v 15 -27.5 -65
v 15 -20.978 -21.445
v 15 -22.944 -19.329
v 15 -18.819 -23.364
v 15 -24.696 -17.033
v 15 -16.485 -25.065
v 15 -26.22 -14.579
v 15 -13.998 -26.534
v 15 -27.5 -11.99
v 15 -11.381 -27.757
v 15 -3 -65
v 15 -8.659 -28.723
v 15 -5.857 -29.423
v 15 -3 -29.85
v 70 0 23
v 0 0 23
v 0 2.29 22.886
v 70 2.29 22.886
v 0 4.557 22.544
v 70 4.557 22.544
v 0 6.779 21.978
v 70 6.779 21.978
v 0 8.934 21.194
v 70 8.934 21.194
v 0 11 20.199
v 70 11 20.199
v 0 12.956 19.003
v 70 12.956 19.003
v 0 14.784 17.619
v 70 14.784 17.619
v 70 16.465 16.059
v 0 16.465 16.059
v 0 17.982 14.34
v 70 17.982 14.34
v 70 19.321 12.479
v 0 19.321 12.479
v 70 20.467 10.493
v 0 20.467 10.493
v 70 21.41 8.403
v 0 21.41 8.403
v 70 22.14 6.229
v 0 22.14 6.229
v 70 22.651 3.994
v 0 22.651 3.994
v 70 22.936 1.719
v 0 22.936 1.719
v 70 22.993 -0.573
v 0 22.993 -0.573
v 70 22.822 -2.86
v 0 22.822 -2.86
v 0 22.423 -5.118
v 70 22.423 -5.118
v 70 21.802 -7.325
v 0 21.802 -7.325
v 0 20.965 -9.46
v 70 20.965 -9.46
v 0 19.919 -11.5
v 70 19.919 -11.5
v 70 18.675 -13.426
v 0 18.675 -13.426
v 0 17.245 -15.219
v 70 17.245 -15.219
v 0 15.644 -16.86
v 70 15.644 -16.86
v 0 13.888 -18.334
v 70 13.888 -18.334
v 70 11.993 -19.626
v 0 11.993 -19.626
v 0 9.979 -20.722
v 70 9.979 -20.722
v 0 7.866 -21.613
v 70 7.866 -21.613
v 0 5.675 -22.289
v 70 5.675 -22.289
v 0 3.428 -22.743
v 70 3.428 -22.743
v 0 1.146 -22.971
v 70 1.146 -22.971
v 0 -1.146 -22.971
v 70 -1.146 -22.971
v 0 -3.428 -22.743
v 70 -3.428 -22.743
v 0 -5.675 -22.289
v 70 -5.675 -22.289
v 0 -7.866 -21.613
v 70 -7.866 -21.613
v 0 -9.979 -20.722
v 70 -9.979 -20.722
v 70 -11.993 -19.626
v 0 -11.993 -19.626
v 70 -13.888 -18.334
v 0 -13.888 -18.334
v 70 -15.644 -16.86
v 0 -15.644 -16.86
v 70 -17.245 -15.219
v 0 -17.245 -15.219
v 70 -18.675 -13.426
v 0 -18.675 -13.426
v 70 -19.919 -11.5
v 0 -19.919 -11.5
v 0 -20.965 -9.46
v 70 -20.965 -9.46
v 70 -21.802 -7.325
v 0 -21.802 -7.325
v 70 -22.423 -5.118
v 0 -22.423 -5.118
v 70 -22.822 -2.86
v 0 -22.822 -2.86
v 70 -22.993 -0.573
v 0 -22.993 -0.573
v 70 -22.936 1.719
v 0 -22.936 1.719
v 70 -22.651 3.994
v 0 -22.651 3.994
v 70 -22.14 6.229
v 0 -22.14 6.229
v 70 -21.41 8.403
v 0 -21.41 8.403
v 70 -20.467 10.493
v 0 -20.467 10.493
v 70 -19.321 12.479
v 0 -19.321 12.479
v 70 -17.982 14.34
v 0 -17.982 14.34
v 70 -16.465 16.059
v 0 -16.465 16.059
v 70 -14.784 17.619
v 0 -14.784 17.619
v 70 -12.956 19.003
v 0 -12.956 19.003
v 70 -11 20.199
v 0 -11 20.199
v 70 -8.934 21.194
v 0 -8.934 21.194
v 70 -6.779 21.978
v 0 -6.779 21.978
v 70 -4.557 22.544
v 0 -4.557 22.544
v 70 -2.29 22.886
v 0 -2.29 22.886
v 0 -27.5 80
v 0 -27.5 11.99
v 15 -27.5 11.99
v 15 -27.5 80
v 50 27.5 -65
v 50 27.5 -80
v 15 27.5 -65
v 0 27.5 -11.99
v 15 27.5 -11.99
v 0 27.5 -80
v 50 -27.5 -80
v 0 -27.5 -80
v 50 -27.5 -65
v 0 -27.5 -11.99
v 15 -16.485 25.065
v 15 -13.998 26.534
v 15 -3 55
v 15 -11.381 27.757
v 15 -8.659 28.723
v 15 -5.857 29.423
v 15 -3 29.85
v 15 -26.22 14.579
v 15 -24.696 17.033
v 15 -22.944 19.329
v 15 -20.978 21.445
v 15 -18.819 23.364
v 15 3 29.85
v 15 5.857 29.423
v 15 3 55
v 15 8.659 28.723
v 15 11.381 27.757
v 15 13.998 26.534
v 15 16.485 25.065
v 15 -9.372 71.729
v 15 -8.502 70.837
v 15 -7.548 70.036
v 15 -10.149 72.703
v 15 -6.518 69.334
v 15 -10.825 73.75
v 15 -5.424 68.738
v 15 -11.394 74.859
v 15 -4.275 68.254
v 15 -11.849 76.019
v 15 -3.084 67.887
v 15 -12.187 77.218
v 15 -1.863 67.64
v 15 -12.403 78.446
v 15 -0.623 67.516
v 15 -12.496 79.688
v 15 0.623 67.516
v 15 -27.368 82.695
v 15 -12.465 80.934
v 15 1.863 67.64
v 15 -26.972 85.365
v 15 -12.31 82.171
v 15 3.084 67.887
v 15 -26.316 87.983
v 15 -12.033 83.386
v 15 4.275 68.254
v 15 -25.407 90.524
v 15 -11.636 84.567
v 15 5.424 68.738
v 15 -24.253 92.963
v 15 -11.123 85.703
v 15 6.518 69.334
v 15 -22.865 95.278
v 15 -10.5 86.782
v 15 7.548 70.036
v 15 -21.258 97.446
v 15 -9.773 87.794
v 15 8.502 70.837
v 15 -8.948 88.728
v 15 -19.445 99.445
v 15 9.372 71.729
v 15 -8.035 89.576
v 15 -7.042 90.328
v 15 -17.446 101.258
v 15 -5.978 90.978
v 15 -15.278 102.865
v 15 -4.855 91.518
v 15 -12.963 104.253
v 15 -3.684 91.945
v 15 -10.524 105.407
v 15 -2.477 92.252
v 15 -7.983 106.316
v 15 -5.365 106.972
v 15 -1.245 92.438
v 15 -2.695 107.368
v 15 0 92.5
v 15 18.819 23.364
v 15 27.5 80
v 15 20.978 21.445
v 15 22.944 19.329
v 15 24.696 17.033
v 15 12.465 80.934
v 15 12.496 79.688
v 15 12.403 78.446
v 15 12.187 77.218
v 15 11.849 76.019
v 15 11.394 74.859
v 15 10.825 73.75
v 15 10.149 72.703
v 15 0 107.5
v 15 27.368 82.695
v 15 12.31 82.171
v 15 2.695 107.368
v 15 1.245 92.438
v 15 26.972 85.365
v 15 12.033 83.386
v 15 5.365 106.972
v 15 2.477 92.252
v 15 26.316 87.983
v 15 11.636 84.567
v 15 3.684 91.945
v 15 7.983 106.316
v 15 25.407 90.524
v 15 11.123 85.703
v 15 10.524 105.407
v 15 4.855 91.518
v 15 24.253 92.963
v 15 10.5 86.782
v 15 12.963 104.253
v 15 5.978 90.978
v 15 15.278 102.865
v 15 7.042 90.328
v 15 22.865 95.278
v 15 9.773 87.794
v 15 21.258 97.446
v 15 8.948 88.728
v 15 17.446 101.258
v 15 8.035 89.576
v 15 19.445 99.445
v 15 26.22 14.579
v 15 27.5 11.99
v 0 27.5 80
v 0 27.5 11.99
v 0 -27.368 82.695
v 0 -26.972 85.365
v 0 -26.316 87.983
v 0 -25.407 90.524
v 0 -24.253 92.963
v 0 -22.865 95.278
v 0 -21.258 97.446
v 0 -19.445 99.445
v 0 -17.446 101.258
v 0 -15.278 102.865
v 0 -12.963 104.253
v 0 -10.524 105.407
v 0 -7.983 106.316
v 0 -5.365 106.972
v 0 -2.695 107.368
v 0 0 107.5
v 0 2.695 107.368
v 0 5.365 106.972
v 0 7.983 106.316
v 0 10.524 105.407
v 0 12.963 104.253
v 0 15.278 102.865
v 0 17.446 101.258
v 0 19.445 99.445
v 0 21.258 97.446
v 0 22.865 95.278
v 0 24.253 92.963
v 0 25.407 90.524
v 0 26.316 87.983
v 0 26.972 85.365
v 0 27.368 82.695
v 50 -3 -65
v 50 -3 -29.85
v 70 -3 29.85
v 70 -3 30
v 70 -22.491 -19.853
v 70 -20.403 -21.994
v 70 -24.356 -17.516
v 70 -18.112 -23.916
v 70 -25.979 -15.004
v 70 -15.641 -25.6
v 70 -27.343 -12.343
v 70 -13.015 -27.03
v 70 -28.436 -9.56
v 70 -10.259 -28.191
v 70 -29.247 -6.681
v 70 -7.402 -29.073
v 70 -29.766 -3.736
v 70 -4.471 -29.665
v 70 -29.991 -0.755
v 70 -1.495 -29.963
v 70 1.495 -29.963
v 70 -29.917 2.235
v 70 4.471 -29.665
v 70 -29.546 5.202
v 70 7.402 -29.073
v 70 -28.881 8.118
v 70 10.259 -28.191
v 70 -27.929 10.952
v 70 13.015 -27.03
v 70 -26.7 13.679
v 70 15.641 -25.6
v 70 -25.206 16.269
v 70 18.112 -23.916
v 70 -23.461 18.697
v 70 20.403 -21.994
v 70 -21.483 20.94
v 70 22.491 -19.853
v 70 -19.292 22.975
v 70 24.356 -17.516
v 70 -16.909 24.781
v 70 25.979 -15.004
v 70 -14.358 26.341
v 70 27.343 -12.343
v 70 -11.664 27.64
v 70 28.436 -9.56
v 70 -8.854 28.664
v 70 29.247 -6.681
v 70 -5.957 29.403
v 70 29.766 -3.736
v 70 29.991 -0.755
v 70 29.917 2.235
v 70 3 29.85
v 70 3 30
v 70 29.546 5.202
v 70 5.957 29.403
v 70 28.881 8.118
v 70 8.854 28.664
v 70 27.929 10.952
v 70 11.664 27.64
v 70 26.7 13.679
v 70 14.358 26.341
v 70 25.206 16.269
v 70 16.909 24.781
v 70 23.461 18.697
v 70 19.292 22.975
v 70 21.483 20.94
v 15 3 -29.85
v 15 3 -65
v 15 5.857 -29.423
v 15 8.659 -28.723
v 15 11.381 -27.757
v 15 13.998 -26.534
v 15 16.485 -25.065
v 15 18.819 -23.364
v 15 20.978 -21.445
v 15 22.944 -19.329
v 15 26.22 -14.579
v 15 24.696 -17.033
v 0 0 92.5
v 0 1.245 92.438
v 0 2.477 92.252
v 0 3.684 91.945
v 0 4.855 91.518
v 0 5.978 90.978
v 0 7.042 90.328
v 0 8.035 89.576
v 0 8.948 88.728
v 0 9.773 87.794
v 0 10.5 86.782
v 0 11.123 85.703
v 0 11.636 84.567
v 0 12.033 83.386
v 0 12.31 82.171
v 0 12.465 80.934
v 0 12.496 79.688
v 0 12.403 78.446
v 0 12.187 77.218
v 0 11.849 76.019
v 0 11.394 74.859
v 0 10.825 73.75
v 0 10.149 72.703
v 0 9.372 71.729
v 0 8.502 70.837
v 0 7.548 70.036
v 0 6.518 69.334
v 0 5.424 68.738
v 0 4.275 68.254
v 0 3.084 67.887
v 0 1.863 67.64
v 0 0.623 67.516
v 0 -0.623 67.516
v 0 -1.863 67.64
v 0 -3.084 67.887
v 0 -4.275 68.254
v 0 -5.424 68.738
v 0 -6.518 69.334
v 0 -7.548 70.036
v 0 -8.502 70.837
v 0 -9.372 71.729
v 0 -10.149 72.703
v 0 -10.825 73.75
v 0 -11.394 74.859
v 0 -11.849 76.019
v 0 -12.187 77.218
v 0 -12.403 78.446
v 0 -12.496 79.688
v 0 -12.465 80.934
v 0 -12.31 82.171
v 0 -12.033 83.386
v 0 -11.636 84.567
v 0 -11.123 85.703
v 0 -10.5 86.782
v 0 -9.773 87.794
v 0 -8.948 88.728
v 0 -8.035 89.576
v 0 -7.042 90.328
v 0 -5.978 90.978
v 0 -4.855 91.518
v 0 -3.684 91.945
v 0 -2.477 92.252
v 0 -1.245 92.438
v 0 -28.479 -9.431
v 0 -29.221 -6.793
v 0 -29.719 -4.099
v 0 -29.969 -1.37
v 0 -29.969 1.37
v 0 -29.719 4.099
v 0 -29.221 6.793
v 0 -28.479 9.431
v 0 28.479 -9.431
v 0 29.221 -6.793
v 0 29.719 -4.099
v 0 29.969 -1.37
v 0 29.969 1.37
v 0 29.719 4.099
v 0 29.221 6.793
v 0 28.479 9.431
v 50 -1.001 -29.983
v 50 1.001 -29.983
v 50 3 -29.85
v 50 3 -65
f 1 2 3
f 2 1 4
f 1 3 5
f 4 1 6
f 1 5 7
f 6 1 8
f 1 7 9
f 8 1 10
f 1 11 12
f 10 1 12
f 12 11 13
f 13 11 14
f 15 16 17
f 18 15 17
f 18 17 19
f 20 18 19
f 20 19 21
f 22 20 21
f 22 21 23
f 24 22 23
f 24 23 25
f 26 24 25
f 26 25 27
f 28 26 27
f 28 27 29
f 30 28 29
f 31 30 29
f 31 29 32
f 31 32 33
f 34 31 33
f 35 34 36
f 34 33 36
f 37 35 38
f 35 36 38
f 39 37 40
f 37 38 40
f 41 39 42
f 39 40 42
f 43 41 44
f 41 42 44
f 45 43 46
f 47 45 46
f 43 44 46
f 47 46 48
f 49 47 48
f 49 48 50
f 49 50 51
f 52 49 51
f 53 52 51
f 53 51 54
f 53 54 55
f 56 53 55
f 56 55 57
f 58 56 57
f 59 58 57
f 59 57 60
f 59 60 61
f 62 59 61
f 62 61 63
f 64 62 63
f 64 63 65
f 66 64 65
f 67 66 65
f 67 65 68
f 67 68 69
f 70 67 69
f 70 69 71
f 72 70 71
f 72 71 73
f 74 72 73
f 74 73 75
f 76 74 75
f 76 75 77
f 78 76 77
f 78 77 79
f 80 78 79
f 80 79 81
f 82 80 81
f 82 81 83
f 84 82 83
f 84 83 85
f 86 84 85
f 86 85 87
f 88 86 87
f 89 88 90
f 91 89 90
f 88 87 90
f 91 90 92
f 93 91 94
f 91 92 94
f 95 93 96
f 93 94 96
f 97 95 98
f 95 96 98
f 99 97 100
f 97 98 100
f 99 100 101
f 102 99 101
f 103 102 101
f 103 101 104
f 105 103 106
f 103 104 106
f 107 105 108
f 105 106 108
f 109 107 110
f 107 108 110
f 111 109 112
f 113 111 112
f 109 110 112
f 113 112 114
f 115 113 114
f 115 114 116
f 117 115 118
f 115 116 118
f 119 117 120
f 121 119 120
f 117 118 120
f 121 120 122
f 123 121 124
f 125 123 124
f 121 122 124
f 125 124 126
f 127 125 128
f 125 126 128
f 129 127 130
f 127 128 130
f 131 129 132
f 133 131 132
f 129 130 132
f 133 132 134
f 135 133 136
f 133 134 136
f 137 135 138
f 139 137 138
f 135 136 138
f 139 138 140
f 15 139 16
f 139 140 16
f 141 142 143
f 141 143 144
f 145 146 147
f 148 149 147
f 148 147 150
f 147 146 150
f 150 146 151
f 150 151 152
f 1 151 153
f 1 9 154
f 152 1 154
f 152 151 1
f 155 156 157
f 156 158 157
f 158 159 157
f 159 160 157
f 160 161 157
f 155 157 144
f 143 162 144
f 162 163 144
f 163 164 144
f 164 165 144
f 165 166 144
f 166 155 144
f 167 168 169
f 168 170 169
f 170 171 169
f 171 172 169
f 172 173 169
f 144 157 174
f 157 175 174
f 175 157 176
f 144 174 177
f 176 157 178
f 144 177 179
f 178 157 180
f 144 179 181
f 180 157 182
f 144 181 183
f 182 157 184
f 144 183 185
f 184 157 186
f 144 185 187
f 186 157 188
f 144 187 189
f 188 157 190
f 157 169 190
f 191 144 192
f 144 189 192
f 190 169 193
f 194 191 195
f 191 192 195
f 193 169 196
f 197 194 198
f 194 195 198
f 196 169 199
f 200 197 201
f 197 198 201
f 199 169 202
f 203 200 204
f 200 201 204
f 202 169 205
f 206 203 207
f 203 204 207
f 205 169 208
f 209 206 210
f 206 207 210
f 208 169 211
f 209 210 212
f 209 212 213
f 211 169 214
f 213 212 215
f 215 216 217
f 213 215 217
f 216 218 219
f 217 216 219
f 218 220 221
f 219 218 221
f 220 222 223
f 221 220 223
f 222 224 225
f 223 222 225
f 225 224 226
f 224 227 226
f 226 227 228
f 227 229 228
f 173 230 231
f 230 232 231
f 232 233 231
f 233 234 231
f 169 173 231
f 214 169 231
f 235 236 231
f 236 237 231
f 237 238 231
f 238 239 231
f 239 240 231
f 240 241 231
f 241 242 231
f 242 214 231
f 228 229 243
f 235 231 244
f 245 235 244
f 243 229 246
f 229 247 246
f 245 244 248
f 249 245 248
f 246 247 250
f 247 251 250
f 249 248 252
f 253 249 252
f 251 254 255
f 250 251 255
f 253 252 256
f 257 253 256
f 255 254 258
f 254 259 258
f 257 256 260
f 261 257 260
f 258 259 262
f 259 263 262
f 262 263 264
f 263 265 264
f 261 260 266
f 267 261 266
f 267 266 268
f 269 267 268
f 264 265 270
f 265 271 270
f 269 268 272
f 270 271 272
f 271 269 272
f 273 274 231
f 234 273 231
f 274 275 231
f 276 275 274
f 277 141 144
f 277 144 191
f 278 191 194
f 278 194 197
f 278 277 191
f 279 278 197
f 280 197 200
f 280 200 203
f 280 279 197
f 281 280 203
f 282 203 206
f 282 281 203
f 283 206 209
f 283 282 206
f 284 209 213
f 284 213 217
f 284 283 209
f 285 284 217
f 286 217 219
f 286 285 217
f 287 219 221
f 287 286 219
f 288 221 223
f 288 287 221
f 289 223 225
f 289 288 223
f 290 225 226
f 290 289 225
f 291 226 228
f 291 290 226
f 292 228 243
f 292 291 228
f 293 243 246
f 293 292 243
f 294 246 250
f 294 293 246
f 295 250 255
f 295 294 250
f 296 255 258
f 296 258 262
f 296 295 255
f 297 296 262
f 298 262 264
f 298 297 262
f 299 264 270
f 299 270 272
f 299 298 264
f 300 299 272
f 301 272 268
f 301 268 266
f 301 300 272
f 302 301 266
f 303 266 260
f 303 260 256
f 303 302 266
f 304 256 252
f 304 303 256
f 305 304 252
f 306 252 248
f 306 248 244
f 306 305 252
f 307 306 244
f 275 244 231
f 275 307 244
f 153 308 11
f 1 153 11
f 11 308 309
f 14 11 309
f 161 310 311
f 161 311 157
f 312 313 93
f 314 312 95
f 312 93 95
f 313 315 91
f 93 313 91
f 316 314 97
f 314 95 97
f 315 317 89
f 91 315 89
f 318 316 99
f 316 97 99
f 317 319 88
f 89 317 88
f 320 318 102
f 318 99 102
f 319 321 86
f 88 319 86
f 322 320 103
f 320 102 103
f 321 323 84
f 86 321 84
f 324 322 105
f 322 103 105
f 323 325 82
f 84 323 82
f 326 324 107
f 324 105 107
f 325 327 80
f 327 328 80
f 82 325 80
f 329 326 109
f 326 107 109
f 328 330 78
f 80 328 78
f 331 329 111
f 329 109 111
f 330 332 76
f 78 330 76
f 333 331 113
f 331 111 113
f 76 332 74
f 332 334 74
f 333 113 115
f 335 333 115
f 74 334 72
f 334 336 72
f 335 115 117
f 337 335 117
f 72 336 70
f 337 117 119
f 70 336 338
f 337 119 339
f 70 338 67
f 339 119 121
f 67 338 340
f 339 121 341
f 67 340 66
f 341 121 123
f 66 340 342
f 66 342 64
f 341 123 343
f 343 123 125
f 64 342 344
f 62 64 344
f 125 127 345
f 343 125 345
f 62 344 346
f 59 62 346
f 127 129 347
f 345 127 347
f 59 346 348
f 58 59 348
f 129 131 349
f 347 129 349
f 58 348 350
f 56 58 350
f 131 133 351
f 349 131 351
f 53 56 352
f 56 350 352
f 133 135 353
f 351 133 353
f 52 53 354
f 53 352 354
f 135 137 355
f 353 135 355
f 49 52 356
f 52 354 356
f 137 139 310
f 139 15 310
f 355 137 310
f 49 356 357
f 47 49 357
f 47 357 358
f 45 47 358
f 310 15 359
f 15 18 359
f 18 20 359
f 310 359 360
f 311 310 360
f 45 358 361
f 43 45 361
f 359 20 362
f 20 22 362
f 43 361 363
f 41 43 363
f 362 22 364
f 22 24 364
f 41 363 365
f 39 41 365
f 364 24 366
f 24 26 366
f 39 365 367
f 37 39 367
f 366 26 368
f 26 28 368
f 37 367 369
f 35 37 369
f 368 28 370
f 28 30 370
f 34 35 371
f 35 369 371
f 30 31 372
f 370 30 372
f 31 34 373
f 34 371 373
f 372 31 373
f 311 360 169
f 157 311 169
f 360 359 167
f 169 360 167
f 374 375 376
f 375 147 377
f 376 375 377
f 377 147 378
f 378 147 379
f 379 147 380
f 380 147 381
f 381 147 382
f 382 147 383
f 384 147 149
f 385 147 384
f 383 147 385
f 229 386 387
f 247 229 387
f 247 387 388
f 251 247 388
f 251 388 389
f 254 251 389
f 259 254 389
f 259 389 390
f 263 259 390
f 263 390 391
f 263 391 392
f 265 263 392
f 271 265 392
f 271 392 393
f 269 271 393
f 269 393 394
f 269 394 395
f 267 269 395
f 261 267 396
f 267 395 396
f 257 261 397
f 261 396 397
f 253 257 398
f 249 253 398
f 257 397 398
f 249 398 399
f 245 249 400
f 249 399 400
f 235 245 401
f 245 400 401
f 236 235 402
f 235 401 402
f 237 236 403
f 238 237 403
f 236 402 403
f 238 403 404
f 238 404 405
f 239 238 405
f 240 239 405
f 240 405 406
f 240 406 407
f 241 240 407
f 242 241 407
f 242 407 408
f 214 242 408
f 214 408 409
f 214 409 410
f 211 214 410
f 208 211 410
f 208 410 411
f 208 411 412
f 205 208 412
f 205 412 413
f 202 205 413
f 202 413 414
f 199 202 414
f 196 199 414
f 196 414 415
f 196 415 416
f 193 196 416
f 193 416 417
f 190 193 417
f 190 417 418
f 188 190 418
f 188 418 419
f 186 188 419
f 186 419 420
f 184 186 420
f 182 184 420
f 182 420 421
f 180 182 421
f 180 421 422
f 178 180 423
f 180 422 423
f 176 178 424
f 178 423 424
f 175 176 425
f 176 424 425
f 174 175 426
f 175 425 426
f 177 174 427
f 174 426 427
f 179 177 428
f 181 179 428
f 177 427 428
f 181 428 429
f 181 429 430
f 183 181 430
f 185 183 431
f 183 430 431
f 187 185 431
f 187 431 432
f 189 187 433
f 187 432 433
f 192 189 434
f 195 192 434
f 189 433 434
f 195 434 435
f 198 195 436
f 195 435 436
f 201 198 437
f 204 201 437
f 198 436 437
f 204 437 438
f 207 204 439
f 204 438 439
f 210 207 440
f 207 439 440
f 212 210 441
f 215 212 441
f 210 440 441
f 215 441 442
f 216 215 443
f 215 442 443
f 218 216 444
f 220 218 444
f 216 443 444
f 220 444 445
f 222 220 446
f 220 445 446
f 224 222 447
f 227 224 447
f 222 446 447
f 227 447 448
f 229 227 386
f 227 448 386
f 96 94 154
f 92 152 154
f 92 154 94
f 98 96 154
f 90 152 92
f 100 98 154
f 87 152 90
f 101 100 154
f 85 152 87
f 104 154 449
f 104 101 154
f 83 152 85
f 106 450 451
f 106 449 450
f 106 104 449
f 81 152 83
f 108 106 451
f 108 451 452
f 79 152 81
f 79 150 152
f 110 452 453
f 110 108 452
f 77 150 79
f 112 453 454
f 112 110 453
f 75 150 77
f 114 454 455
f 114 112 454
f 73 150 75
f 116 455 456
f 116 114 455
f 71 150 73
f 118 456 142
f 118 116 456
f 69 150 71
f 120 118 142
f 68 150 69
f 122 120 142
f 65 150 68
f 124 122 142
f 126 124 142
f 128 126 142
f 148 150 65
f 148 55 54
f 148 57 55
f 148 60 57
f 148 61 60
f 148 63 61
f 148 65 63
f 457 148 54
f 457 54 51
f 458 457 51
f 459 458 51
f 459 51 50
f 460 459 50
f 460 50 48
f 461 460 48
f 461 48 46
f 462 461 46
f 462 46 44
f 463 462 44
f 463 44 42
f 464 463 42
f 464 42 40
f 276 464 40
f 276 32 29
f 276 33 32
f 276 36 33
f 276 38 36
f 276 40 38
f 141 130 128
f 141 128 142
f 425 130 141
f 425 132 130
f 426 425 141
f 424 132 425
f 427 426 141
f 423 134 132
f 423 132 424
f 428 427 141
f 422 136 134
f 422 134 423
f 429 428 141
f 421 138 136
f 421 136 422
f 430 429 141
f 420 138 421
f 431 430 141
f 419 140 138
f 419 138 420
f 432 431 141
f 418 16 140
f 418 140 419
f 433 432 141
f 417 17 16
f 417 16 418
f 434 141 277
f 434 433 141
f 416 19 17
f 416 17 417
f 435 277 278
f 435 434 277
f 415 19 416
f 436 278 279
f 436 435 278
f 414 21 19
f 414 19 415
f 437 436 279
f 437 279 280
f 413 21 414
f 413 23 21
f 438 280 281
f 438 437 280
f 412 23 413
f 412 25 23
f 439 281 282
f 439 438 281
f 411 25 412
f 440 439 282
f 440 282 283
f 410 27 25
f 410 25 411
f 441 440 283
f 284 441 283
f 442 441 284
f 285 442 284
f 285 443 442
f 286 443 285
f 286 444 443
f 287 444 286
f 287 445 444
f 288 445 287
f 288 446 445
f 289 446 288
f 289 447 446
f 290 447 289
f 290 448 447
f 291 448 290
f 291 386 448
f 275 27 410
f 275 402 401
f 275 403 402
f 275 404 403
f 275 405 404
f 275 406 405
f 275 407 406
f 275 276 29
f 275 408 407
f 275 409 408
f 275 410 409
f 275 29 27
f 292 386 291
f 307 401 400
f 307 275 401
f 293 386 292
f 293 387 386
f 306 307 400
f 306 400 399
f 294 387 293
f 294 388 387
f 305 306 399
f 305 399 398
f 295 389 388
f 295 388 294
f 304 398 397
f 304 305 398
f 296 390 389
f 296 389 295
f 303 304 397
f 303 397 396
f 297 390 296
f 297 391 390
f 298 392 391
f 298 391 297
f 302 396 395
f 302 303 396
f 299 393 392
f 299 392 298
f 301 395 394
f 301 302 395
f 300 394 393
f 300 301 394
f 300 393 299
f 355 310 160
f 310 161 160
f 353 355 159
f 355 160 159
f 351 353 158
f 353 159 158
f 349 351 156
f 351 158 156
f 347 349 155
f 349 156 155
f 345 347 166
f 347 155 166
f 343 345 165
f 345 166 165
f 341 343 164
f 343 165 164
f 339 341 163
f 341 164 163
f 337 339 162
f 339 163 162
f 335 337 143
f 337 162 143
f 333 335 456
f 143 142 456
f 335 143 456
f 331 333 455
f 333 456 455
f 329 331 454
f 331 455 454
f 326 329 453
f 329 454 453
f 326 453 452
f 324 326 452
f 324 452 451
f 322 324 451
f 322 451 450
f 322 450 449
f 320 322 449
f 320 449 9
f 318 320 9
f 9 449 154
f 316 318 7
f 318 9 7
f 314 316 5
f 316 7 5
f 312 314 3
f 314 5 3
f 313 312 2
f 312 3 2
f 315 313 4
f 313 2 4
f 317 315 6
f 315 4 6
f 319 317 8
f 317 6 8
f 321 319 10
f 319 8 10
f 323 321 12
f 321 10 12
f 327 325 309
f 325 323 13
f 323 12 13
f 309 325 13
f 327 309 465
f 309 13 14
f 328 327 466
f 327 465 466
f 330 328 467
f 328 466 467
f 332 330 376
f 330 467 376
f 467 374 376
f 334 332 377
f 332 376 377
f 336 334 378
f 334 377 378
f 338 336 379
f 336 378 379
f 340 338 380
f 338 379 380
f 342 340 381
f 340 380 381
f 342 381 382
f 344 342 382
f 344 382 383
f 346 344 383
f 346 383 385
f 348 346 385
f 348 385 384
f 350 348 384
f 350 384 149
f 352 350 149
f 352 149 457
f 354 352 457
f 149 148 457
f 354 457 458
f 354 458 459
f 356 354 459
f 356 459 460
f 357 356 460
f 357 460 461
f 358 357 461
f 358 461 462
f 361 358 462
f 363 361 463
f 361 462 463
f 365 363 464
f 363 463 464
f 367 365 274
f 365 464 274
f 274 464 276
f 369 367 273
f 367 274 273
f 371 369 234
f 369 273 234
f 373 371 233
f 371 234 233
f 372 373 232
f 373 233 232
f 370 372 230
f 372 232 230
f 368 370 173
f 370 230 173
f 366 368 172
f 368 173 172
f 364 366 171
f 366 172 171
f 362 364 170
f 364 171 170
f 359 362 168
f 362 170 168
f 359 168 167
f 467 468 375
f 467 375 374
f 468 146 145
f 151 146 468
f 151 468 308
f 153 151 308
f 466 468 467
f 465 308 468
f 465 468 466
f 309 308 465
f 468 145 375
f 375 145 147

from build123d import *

# Parameters (mm, degrees)
BOSS_EXTRUDE1_DEPTH      = 15
BOSS_EXTRUDE2_DEPTH      = 55
BOSS_EXTRUDE2_DEPTH_BACK = 15
SKETCH2_R                = 30
HOLE1_D                  = 46
SKETCH5_W                = 50
SKETCH5_H                = 55
BOSS_EXTRUDE3_DEPTH      = 15
RIB1_REACH               = 133.743
SKETCH6_WALL_W           = 300.486242526
SKETCH6_WALL_H           = 6
BOSS_EXTRUDE5_DEPTH      = 3
HOLE2_D                  = 25


with BuildPart() as part:
    # Sketch1 → Boss-Extrude1 (new body)
    with BuildSketch(Plane(origin=(0, 0, 0), x_dir=(0, 0, -1), z_dir=(1, 0, 0))):
        with BuildLine():
            Line((-80, 27.5), (80, 27.5))
            Line((80, 27.5), (80, -27.5))
            Line((80, -27.5), (-80, -27.5))
            ThreePointArc((-80, -27.5), (-107.5, 0), (-80, 27.5))
        make_face()
    extrude(amount=BOSS_EXTRUDE1_DEPTH)

    # Sketch2 → Boss-Extrude2 (add, two sides: drawn at the far end of the back side and taken through both)
    with BuildSketch(Plane(origin=(15, 0, 0), x_dir=(0, 0, -1), z_dir=(1, 0, 0)).offset(-BOSS_EXTRUDE2_DEPTH_BACK)):
        Circle(SKETCH2_R)
    extrude(amount=BOSS_EXTRUDE2_DEPTH + BOSS_EXTRUDE2_DEPTH_BACK)

    # Hole1 (through all)
    with Locations(Plane(origin=(70, 0, 0), x_dir=(0, 0, -1), z_dir=(1, 0, 0))):
        with Locations((0, 0)):
            Hole(HOLE1_D / 2)

    # Sketch5 → Boss-Extrude3 (add)
    with BuildSketch(Plane(origin=(0, 0, -80), x_dir=(-1, 0, 0), z_dir=(0, 0, -1))):
        with Locations((-25, 0)):
            Rectangle(SKETCH5_W, SKETCH5_H)
    extrude(amount=-BOSS_EXTRUDE3_DEPTH)

    # Sketch6 wall → Rib1 (add, up to next)
    with BuildSketch(Plane(origin=(50, 0, -47.5), x_dir=(0, 0, 1), z_dir=(1, 0, 0)), mode=Mode.PRIVATE) as rib1_sk1:
        Rectangle(SKETCH6_WALL_W, SKETCH6_WALL_H)
    rib1_tool1 = extrude(rib1_sk1.sketch, amount=-RIB1_REACH, mode=Mode.PRIVATE) - part.part
    add(rib1_tool1.solids().sort_by_distance((50, 0, -47.5))[0])

    # Sketch7 → Boss-Extrude5 (add, symmetric)
    with BuildSketch(Plane(origin=(0, 0, 0), x_dir=(1, 0, 0), z_dir=(0, 1, 0))):
        Polygon((70, -30), (15, -55), (15, -28), (70, -28), align=None)
    extrude(amount=BOSS_EXTRUDE5_DEPTH, both=True)

    # Hole2 (through all)
    with Locations(Plane(origin=(15, 0, 0), x_dir=(0, 0, -1), z_dir=(1, 0, 0))):
        with Locations((-80, 0)):
            Hole(HOLE2_D / 2)


solid = part.part
